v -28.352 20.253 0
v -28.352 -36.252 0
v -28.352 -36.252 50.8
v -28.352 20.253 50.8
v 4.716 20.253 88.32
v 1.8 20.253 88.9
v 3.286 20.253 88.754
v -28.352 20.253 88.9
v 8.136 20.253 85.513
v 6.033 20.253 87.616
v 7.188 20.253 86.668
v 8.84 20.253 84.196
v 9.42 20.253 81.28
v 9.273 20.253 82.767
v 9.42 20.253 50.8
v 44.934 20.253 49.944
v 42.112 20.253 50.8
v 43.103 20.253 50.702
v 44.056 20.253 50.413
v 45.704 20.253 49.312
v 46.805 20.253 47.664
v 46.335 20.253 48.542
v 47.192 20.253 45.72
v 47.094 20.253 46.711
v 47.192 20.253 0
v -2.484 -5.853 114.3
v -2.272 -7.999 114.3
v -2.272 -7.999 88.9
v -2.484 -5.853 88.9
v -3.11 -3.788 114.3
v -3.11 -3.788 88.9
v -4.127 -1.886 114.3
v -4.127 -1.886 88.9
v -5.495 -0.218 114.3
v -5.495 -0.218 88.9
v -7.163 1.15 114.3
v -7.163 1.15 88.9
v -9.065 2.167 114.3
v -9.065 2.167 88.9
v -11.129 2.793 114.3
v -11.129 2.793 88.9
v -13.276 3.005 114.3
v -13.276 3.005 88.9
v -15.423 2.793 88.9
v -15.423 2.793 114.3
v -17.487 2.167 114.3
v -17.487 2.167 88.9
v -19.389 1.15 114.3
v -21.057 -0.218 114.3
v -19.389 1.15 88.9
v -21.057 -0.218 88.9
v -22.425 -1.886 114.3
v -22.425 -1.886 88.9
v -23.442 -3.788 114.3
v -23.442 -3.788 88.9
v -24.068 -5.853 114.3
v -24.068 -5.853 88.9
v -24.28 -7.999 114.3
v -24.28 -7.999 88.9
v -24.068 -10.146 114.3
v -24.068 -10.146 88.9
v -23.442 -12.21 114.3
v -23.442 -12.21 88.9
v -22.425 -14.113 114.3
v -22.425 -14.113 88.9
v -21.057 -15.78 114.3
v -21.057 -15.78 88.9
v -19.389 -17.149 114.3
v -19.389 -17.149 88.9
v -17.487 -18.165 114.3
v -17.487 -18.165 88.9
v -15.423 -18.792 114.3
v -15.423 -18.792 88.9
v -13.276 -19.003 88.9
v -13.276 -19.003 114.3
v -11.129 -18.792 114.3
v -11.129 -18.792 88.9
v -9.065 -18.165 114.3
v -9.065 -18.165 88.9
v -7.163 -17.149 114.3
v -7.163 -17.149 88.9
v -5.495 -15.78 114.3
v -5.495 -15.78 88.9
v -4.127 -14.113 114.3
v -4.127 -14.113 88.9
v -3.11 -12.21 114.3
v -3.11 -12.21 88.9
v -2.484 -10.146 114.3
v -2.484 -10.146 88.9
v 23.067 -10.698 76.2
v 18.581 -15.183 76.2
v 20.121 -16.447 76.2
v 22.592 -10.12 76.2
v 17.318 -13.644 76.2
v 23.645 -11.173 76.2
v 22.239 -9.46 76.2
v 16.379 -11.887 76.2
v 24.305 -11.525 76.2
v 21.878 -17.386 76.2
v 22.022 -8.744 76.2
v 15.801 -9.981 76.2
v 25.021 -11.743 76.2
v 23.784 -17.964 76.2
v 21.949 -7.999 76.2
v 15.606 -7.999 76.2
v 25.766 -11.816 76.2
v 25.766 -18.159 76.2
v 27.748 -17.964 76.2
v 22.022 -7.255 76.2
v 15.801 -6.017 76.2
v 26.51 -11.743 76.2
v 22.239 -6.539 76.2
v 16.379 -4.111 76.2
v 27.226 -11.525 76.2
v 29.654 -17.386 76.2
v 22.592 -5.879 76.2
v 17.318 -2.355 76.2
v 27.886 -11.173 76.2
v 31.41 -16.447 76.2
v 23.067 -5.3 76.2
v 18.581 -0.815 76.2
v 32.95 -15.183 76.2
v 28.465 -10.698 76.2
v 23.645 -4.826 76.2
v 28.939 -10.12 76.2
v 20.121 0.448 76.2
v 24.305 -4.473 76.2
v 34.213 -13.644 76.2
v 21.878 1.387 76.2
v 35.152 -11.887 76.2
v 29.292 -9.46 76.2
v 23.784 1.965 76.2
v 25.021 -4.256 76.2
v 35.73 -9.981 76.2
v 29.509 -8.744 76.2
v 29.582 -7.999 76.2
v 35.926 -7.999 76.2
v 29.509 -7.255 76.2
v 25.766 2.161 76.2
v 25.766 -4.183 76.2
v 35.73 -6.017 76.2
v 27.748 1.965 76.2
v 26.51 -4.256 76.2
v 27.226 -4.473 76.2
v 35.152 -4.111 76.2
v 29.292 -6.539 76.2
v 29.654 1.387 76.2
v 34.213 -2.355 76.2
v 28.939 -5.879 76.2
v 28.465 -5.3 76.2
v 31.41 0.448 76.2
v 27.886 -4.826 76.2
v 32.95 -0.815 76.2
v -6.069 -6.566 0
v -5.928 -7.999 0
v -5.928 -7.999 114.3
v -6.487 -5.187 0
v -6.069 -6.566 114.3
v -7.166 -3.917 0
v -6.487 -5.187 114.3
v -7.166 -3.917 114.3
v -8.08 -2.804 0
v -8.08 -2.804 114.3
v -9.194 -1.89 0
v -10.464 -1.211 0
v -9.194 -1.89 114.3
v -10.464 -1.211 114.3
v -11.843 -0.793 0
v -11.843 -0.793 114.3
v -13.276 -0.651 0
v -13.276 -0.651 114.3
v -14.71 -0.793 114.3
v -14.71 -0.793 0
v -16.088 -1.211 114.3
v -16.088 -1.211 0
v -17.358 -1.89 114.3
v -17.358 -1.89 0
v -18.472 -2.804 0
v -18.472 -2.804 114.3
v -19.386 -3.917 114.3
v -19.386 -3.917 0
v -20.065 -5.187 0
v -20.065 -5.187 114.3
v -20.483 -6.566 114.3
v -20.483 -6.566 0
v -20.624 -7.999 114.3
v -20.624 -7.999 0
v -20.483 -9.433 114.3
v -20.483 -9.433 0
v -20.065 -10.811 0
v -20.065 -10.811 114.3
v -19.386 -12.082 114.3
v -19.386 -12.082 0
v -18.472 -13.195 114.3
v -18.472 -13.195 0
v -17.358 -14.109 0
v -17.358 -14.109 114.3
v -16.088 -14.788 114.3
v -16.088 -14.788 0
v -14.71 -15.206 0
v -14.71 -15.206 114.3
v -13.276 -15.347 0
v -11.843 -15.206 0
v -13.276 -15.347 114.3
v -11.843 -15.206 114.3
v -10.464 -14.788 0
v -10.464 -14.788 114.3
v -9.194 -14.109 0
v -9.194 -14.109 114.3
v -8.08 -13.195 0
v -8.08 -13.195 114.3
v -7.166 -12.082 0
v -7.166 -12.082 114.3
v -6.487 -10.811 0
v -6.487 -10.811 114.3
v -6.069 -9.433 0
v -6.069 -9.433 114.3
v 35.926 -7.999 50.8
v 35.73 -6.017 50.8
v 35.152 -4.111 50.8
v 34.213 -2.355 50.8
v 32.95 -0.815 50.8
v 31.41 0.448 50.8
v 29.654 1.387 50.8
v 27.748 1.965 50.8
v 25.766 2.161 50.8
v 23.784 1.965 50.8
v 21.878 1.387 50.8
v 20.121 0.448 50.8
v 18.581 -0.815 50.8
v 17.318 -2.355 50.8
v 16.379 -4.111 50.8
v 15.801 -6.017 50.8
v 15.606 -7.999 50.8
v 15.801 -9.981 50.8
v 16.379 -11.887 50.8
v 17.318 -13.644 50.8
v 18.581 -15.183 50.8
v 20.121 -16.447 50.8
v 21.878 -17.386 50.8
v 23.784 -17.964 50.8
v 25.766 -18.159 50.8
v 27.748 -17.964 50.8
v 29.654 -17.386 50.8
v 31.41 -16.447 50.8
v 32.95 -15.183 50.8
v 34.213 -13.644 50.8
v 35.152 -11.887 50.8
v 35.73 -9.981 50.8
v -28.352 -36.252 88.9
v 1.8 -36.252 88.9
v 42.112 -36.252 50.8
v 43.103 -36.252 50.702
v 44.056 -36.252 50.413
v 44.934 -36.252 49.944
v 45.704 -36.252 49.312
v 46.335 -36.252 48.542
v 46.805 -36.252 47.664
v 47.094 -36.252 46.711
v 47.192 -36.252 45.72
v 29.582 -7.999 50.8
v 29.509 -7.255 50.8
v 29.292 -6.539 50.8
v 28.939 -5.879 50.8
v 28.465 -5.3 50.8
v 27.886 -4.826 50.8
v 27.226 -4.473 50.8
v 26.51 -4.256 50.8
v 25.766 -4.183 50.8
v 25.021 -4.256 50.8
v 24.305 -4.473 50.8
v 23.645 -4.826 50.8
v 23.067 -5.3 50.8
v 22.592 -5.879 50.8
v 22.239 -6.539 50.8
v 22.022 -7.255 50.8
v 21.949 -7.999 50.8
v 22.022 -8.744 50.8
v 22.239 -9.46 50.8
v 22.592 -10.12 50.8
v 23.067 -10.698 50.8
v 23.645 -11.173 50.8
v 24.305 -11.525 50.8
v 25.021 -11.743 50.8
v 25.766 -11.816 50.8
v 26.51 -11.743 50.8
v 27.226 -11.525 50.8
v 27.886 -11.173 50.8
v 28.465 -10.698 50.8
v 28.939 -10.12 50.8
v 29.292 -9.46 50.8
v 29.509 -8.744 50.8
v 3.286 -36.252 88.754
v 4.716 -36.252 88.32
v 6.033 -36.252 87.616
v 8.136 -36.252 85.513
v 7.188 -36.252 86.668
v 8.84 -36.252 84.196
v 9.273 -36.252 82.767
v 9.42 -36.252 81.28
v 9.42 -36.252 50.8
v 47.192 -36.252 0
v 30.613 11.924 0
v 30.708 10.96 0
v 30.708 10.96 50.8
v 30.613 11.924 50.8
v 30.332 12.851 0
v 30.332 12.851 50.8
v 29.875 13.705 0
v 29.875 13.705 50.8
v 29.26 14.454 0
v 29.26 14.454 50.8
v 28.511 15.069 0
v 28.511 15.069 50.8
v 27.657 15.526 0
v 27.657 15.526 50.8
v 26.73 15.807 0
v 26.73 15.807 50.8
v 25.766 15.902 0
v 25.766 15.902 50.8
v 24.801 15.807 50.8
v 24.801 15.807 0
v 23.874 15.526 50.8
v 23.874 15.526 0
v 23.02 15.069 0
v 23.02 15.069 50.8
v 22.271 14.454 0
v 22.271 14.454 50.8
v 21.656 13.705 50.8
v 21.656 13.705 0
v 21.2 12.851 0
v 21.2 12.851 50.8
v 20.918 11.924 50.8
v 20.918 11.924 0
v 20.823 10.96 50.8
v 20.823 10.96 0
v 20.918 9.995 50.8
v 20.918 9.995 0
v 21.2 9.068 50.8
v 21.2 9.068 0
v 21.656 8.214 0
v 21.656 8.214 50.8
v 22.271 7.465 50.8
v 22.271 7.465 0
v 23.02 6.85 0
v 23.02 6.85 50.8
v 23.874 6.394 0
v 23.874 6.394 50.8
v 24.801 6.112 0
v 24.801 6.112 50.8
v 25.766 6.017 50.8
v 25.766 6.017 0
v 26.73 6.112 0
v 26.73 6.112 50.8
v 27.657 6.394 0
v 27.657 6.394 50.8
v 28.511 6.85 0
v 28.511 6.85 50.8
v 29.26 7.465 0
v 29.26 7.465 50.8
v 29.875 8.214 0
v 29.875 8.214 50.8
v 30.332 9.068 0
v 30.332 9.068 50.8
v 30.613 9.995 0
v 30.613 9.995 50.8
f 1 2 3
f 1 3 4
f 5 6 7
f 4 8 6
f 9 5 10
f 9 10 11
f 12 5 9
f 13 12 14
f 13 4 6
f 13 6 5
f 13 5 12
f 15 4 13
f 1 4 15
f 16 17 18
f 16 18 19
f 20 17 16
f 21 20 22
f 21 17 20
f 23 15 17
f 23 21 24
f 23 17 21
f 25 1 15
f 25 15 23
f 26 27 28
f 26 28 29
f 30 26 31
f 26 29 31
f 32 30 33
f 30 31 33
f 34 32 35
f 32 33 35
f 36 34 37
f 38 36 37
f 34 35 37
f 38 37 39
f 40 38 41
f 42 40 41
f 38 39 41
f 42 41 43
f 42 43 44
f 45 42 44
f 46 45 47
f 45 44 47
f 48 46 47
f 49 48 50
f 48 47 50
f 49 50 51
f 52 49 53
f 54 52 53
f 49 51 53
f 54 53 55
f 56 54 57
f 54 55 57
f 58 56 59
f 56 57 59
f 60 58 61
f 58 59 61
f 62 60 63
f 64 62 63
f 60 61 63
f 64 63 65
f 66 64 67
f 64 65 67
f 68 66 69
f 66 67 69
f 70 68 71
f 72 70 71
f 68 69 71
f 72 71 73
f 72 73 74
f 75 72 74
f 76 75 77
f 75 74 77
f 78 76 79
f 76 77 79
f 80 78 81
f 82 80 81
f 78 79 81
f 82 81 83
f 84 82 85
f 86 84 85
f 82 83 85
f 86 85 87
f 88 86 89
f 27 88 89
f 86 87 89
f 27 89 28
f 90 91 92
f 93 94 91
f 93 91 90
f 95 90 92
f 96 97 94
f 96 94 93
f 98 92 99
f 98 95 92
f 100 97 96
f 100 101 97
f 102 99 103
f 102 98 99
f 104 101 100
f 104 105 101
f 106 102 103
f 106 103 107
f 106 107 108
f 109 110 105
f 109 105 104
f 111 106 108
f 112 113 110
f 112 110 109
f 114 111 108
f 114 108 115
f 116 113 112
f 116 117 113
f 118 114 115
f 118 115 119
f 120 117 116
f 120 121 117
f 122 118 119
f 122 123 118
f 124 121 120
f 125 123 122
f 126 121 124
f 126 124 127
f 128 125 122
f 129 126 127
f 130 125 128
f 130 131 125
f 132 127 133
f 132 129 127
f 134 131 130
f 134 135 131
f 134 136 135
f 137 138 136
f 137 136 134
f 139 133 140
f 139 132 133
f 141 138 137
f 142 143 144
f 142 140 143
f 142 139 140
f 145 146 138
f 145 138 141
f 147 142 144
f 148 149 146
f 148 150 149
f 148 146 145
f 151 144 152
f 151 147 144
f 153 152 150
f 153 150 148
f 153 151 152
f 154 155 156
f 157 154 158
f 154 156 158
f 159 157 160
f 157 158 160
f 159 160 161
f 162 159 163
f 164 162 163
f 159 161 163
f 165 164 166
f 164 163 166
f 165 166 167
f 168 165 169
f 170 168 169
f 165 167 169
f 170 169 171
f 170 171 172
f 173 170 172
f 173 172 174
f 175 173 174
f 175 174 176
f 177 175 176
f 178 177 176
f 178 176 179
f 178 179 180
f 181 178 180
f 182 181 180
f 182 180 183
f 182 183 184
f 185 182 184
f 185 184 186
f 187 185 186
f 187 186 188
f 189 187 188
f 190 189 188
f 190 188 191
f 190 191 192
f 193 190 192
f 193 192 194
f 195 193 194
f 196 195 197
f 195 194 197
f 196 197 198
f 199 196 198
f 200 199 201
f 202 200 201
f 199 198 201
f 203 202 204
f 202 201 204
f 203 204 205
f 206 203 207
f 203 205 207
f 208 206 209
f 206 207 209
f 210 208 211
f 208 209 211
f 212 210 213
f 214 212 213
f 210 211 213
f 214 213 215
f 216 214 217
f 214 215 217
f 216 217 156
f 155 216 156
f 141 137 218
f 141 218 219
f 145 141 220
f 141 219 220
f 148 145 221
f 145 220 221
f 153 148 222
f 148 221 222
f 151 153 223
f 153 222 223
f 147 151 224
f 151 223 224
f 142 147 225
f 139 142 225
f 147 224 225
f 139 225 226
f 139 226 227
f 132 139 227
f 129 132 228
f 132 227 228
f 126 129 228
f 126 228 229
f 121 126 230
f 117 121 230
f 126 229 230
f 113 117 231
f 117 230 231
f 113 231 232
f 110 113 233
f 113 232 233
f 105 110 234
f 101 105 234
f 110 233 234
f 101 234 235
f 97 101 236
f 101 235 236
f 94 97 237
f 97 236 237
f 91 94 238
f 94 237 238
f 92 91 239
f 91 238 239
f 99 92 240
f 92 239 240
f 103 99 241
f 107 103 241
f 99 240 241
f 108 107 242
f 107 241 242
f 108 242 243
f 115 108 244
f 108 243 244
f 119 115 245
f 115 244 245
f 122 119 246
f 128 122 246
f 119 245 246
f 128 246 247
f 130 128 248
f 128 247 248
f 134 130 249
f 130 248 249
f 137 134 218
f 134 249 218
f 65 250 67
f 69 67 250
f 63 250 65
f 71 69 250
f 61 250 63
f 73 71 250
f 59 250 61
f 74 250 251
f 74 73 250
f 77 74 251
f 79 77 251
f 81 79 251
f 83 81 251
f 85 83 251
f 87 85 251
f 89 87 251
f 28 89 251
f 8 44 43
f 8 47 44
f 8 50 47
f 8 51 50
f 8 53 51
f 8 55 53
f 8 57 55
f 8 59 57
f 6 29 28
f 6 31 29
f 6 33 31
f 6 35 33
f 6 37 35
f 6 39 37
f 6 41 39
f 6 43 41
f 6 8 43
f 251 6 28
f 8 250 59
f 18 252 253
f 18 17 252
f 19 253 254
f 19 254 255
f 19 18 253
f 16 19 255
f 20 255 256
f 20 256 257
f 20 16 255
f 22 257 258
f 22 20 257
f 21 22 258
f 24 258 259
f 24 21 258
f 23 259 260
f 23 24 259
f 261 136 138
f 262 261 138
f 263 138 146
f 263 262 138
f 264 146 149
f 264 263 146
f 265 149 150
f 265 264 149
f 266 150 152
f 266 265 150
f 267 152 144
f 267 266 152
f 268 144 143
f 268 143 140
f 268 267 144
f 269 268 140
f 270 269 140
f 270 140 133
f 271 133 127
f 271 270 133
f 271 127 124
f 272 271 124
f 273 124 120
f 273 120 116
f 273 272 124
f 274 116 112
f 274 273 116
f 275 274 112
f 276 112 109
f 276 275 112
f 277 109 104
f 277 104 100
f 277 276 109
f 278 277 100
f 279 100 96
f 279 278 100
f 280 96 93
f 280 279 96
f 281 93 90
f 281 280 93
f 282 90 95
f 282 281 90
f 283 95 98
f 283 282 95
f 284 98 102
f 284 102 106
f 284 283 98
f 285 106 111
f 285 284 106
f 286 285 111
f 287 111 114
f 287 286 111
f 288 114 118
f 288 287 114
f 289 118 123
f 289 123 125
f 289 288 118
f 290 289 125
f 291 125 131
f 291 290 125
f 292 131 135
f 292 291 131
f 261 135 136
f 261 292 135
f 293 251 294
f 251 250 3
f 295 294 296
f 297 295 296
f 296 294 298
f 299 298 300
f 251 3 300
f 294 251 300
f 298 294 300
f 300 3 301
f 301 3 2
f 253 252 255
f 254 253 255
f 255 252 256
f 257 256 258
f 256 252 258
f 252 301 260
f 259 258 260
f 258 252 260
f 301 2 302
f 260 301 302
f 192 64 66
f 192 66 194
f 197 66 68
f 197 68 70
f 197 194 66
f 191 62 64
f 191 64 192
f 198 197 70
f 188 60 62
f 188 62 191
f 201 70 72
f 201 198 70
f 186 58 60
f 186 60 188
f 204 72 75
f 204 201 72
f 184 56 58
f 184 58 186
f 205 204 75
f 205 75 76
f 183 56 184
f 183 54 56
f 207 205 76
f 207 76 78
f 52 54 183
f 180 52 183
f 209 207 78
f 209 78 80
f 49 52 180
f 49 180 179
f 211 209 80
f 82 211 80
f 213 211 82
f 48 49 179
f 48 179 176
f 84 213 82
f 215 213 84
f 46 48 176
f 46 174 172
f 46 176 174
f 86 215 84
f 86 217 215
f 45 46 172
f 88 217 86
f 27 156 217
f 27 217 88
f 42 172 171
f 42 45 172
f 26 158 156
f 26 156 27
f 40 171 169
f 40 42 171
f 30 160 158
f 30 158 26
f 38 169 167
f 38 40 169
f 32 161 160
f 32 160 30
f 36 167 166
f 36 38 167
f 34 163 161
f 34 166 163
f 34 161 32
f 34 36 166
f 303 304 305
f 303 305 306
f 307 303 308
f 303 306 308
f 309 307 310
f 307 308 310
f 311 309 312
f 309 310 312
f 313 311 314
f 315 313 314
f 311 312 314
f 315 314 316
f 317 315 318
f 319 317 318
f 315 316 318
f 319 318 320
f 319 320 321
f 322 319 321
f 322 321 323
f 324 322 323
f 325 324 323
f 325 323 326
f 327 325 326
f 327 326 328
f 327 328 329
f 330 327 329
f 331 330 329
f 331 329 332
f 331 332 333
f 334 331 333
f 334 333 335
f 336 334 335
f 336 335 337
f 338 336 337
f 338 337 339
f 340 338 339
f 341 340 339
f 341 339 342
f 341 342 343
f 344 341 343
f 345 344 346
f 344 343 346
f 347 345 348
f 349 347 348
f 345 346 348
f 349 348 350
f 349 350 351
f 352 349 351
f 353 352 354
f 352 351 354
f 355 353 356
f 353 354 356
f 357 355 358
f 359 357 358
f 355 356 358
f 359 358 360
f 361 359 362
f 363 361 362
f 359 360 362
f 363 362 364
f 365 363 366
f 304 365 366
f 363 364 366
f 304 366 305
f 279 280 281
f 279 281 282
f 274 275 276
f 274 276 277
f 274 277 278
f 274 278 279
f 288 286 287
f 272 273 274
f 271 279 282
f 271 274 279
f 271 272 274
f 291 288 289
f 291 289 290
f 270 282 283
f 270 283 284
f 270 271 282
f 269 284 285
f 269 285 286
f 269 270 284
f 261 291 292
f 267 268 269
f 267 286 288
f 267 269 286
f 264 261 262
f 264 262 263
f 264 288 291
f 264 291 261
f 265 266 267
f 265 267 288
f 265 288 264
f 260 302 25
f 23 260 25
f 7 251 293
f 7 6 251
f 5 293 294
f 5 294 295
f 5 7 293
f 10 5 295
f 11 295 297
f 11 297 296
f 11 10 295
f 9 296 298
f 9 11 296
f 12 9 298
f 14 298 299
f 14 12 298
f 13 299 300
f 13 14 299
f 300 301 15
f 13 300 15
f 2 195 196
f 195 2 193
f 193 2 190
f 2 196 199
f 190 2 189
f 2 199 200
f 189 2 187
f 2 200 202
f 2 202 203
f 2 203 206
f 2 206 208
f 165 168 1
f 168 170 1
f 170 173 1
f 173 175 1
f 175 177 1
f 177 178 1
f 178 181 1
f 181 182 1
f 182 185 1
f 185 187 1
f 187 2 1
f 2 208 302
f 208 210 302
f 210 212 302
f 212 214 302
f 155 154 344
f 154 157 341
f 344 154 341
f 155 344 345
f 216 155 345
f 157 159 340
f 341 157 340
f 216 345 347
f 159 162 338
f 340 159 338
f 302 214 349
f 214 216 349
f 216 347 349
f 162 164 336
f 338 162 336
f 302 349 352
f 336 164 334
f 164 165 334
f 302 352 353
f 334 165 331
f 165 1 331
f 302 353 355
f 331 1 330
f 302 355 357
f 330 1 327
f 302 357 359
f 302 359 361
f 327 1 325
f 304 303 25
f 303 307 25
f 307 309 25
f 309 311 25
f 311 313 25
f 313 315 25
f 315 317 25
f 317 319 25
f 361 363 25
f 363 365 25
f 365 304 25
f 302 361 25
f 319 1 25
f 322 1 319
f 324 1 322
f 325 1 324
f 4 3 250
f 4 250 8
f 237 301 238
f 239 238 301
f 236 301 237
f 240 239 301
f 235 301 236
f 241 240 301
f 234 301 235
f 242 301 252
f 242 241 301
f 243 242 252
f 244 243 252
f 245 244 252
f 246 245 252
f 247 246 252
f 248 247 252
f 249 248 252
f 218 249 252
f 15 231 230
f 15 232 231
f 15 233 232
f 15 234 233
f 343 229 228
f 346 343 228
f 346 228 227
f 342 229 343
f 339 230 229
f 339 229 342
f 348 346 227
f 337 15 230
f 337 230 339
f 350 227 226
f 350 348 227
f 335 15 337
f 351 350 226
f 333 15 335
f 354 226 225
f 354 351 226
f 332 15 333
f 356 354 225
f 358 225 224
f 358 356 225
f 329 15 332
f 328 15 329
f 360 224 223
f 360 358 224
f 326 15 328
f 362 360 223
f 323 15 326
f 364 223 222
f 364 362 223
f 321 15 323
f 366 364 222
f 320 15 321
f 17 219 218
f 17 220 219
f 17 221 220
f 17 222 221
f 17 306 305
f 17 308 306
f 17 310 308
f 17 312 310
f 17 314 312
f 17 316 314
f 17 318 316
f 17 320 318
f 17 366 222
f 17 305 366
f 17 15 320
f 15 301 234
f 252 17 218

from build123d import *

# Parameters (mm, degrees)
F0_W      = 75.543475
F0_H      = 56.50536
F1_DEPTH  = 50.8
F2_W      = 37.771738
F2_H      = 56.50536
F3_DEPTH  = 38.1
F4_R      = 7.62
F5_R      = 5.08
F6_R      = 11.003795
F8_DEPTH  = 25.4
F7_R      = 10.16
F7_R_2    = 3.816716
F9_DEPTH  = 25.4
F7_R_3    = 4.942263
F10_DEPTH = 142.256165
F11_R     = 7.347925
F12_DEPTH = 124.534214


with BuildPart() as f1:
    # F0 (on Top) → F1 (new body)
    with BuildSketch(Plane.XY):
        with Locations((9.419816, -7.99929)):
            Rectangle(F0_W, F0_H)
    extrude(amount=F1_DEPTH)

    # F2 (on face) → F3 (join)
    with BuildSketch(Plane.XY.offset(50.8)):
        with Locations((-9.466053, -7.99929)):
            Rectangle(F2_W, F2_H)
    extrude(amount=F3_DEPTH)

    # F4
    f4_edges = [f1.edges().sort_by_distance(p)[0] for p in [
        (9.419816, -7.99929, 88.9),
    ]]
    fillet(f4_edges, radius=F4_R)

    # F5
    f5_edges = [f1.edges().sort_by_distance(p)[0] for p in [
        (47.191553, -7.99929, 50.8),
    ]]
    fillet(f5_edges, radius=F5_R)

    # F6 (on face) → F8 (join)
    with BuildSketch(Plane.XY.offset(88.9)):
        with Locations((-13.276053, -7.99929)):
            Circle(F6_R)
    extrude(amount=F8_DEPTH)

    # F7 (on face) → F9 (join)
    with BuildSketch(Plane.XY.offset(50.8)):
        with Locations((25.765684, -7.99929)):
            Circle(F7_R)
        with Locations((25.765684, -7.99929)):
            Circle(F7_R_2, mode=Mode.SUBTRACT)
    extrude(amount=F9_DEPTH)

    # F7 (on face) → F10 (cut)
    with BuildSketch(Plane.XY.offset(50.8)):
        with Locations((25.765684, 10.959573)):
            Circle(F7_R_3)
    extrude(amount=-F10_DEPTH, mode=Mode.SUBTRACT)

    # F11 (on face) → F12 (cut)
    with BuildSketch(Plane.XY.offset(114.3)):
        with Locations((-13.276053, -7.99929)):
            Circle(F11_R)
    extrude(amount=-F12_DEPTH, mode=Mode.SUBTRACT)


solid = f1.part
